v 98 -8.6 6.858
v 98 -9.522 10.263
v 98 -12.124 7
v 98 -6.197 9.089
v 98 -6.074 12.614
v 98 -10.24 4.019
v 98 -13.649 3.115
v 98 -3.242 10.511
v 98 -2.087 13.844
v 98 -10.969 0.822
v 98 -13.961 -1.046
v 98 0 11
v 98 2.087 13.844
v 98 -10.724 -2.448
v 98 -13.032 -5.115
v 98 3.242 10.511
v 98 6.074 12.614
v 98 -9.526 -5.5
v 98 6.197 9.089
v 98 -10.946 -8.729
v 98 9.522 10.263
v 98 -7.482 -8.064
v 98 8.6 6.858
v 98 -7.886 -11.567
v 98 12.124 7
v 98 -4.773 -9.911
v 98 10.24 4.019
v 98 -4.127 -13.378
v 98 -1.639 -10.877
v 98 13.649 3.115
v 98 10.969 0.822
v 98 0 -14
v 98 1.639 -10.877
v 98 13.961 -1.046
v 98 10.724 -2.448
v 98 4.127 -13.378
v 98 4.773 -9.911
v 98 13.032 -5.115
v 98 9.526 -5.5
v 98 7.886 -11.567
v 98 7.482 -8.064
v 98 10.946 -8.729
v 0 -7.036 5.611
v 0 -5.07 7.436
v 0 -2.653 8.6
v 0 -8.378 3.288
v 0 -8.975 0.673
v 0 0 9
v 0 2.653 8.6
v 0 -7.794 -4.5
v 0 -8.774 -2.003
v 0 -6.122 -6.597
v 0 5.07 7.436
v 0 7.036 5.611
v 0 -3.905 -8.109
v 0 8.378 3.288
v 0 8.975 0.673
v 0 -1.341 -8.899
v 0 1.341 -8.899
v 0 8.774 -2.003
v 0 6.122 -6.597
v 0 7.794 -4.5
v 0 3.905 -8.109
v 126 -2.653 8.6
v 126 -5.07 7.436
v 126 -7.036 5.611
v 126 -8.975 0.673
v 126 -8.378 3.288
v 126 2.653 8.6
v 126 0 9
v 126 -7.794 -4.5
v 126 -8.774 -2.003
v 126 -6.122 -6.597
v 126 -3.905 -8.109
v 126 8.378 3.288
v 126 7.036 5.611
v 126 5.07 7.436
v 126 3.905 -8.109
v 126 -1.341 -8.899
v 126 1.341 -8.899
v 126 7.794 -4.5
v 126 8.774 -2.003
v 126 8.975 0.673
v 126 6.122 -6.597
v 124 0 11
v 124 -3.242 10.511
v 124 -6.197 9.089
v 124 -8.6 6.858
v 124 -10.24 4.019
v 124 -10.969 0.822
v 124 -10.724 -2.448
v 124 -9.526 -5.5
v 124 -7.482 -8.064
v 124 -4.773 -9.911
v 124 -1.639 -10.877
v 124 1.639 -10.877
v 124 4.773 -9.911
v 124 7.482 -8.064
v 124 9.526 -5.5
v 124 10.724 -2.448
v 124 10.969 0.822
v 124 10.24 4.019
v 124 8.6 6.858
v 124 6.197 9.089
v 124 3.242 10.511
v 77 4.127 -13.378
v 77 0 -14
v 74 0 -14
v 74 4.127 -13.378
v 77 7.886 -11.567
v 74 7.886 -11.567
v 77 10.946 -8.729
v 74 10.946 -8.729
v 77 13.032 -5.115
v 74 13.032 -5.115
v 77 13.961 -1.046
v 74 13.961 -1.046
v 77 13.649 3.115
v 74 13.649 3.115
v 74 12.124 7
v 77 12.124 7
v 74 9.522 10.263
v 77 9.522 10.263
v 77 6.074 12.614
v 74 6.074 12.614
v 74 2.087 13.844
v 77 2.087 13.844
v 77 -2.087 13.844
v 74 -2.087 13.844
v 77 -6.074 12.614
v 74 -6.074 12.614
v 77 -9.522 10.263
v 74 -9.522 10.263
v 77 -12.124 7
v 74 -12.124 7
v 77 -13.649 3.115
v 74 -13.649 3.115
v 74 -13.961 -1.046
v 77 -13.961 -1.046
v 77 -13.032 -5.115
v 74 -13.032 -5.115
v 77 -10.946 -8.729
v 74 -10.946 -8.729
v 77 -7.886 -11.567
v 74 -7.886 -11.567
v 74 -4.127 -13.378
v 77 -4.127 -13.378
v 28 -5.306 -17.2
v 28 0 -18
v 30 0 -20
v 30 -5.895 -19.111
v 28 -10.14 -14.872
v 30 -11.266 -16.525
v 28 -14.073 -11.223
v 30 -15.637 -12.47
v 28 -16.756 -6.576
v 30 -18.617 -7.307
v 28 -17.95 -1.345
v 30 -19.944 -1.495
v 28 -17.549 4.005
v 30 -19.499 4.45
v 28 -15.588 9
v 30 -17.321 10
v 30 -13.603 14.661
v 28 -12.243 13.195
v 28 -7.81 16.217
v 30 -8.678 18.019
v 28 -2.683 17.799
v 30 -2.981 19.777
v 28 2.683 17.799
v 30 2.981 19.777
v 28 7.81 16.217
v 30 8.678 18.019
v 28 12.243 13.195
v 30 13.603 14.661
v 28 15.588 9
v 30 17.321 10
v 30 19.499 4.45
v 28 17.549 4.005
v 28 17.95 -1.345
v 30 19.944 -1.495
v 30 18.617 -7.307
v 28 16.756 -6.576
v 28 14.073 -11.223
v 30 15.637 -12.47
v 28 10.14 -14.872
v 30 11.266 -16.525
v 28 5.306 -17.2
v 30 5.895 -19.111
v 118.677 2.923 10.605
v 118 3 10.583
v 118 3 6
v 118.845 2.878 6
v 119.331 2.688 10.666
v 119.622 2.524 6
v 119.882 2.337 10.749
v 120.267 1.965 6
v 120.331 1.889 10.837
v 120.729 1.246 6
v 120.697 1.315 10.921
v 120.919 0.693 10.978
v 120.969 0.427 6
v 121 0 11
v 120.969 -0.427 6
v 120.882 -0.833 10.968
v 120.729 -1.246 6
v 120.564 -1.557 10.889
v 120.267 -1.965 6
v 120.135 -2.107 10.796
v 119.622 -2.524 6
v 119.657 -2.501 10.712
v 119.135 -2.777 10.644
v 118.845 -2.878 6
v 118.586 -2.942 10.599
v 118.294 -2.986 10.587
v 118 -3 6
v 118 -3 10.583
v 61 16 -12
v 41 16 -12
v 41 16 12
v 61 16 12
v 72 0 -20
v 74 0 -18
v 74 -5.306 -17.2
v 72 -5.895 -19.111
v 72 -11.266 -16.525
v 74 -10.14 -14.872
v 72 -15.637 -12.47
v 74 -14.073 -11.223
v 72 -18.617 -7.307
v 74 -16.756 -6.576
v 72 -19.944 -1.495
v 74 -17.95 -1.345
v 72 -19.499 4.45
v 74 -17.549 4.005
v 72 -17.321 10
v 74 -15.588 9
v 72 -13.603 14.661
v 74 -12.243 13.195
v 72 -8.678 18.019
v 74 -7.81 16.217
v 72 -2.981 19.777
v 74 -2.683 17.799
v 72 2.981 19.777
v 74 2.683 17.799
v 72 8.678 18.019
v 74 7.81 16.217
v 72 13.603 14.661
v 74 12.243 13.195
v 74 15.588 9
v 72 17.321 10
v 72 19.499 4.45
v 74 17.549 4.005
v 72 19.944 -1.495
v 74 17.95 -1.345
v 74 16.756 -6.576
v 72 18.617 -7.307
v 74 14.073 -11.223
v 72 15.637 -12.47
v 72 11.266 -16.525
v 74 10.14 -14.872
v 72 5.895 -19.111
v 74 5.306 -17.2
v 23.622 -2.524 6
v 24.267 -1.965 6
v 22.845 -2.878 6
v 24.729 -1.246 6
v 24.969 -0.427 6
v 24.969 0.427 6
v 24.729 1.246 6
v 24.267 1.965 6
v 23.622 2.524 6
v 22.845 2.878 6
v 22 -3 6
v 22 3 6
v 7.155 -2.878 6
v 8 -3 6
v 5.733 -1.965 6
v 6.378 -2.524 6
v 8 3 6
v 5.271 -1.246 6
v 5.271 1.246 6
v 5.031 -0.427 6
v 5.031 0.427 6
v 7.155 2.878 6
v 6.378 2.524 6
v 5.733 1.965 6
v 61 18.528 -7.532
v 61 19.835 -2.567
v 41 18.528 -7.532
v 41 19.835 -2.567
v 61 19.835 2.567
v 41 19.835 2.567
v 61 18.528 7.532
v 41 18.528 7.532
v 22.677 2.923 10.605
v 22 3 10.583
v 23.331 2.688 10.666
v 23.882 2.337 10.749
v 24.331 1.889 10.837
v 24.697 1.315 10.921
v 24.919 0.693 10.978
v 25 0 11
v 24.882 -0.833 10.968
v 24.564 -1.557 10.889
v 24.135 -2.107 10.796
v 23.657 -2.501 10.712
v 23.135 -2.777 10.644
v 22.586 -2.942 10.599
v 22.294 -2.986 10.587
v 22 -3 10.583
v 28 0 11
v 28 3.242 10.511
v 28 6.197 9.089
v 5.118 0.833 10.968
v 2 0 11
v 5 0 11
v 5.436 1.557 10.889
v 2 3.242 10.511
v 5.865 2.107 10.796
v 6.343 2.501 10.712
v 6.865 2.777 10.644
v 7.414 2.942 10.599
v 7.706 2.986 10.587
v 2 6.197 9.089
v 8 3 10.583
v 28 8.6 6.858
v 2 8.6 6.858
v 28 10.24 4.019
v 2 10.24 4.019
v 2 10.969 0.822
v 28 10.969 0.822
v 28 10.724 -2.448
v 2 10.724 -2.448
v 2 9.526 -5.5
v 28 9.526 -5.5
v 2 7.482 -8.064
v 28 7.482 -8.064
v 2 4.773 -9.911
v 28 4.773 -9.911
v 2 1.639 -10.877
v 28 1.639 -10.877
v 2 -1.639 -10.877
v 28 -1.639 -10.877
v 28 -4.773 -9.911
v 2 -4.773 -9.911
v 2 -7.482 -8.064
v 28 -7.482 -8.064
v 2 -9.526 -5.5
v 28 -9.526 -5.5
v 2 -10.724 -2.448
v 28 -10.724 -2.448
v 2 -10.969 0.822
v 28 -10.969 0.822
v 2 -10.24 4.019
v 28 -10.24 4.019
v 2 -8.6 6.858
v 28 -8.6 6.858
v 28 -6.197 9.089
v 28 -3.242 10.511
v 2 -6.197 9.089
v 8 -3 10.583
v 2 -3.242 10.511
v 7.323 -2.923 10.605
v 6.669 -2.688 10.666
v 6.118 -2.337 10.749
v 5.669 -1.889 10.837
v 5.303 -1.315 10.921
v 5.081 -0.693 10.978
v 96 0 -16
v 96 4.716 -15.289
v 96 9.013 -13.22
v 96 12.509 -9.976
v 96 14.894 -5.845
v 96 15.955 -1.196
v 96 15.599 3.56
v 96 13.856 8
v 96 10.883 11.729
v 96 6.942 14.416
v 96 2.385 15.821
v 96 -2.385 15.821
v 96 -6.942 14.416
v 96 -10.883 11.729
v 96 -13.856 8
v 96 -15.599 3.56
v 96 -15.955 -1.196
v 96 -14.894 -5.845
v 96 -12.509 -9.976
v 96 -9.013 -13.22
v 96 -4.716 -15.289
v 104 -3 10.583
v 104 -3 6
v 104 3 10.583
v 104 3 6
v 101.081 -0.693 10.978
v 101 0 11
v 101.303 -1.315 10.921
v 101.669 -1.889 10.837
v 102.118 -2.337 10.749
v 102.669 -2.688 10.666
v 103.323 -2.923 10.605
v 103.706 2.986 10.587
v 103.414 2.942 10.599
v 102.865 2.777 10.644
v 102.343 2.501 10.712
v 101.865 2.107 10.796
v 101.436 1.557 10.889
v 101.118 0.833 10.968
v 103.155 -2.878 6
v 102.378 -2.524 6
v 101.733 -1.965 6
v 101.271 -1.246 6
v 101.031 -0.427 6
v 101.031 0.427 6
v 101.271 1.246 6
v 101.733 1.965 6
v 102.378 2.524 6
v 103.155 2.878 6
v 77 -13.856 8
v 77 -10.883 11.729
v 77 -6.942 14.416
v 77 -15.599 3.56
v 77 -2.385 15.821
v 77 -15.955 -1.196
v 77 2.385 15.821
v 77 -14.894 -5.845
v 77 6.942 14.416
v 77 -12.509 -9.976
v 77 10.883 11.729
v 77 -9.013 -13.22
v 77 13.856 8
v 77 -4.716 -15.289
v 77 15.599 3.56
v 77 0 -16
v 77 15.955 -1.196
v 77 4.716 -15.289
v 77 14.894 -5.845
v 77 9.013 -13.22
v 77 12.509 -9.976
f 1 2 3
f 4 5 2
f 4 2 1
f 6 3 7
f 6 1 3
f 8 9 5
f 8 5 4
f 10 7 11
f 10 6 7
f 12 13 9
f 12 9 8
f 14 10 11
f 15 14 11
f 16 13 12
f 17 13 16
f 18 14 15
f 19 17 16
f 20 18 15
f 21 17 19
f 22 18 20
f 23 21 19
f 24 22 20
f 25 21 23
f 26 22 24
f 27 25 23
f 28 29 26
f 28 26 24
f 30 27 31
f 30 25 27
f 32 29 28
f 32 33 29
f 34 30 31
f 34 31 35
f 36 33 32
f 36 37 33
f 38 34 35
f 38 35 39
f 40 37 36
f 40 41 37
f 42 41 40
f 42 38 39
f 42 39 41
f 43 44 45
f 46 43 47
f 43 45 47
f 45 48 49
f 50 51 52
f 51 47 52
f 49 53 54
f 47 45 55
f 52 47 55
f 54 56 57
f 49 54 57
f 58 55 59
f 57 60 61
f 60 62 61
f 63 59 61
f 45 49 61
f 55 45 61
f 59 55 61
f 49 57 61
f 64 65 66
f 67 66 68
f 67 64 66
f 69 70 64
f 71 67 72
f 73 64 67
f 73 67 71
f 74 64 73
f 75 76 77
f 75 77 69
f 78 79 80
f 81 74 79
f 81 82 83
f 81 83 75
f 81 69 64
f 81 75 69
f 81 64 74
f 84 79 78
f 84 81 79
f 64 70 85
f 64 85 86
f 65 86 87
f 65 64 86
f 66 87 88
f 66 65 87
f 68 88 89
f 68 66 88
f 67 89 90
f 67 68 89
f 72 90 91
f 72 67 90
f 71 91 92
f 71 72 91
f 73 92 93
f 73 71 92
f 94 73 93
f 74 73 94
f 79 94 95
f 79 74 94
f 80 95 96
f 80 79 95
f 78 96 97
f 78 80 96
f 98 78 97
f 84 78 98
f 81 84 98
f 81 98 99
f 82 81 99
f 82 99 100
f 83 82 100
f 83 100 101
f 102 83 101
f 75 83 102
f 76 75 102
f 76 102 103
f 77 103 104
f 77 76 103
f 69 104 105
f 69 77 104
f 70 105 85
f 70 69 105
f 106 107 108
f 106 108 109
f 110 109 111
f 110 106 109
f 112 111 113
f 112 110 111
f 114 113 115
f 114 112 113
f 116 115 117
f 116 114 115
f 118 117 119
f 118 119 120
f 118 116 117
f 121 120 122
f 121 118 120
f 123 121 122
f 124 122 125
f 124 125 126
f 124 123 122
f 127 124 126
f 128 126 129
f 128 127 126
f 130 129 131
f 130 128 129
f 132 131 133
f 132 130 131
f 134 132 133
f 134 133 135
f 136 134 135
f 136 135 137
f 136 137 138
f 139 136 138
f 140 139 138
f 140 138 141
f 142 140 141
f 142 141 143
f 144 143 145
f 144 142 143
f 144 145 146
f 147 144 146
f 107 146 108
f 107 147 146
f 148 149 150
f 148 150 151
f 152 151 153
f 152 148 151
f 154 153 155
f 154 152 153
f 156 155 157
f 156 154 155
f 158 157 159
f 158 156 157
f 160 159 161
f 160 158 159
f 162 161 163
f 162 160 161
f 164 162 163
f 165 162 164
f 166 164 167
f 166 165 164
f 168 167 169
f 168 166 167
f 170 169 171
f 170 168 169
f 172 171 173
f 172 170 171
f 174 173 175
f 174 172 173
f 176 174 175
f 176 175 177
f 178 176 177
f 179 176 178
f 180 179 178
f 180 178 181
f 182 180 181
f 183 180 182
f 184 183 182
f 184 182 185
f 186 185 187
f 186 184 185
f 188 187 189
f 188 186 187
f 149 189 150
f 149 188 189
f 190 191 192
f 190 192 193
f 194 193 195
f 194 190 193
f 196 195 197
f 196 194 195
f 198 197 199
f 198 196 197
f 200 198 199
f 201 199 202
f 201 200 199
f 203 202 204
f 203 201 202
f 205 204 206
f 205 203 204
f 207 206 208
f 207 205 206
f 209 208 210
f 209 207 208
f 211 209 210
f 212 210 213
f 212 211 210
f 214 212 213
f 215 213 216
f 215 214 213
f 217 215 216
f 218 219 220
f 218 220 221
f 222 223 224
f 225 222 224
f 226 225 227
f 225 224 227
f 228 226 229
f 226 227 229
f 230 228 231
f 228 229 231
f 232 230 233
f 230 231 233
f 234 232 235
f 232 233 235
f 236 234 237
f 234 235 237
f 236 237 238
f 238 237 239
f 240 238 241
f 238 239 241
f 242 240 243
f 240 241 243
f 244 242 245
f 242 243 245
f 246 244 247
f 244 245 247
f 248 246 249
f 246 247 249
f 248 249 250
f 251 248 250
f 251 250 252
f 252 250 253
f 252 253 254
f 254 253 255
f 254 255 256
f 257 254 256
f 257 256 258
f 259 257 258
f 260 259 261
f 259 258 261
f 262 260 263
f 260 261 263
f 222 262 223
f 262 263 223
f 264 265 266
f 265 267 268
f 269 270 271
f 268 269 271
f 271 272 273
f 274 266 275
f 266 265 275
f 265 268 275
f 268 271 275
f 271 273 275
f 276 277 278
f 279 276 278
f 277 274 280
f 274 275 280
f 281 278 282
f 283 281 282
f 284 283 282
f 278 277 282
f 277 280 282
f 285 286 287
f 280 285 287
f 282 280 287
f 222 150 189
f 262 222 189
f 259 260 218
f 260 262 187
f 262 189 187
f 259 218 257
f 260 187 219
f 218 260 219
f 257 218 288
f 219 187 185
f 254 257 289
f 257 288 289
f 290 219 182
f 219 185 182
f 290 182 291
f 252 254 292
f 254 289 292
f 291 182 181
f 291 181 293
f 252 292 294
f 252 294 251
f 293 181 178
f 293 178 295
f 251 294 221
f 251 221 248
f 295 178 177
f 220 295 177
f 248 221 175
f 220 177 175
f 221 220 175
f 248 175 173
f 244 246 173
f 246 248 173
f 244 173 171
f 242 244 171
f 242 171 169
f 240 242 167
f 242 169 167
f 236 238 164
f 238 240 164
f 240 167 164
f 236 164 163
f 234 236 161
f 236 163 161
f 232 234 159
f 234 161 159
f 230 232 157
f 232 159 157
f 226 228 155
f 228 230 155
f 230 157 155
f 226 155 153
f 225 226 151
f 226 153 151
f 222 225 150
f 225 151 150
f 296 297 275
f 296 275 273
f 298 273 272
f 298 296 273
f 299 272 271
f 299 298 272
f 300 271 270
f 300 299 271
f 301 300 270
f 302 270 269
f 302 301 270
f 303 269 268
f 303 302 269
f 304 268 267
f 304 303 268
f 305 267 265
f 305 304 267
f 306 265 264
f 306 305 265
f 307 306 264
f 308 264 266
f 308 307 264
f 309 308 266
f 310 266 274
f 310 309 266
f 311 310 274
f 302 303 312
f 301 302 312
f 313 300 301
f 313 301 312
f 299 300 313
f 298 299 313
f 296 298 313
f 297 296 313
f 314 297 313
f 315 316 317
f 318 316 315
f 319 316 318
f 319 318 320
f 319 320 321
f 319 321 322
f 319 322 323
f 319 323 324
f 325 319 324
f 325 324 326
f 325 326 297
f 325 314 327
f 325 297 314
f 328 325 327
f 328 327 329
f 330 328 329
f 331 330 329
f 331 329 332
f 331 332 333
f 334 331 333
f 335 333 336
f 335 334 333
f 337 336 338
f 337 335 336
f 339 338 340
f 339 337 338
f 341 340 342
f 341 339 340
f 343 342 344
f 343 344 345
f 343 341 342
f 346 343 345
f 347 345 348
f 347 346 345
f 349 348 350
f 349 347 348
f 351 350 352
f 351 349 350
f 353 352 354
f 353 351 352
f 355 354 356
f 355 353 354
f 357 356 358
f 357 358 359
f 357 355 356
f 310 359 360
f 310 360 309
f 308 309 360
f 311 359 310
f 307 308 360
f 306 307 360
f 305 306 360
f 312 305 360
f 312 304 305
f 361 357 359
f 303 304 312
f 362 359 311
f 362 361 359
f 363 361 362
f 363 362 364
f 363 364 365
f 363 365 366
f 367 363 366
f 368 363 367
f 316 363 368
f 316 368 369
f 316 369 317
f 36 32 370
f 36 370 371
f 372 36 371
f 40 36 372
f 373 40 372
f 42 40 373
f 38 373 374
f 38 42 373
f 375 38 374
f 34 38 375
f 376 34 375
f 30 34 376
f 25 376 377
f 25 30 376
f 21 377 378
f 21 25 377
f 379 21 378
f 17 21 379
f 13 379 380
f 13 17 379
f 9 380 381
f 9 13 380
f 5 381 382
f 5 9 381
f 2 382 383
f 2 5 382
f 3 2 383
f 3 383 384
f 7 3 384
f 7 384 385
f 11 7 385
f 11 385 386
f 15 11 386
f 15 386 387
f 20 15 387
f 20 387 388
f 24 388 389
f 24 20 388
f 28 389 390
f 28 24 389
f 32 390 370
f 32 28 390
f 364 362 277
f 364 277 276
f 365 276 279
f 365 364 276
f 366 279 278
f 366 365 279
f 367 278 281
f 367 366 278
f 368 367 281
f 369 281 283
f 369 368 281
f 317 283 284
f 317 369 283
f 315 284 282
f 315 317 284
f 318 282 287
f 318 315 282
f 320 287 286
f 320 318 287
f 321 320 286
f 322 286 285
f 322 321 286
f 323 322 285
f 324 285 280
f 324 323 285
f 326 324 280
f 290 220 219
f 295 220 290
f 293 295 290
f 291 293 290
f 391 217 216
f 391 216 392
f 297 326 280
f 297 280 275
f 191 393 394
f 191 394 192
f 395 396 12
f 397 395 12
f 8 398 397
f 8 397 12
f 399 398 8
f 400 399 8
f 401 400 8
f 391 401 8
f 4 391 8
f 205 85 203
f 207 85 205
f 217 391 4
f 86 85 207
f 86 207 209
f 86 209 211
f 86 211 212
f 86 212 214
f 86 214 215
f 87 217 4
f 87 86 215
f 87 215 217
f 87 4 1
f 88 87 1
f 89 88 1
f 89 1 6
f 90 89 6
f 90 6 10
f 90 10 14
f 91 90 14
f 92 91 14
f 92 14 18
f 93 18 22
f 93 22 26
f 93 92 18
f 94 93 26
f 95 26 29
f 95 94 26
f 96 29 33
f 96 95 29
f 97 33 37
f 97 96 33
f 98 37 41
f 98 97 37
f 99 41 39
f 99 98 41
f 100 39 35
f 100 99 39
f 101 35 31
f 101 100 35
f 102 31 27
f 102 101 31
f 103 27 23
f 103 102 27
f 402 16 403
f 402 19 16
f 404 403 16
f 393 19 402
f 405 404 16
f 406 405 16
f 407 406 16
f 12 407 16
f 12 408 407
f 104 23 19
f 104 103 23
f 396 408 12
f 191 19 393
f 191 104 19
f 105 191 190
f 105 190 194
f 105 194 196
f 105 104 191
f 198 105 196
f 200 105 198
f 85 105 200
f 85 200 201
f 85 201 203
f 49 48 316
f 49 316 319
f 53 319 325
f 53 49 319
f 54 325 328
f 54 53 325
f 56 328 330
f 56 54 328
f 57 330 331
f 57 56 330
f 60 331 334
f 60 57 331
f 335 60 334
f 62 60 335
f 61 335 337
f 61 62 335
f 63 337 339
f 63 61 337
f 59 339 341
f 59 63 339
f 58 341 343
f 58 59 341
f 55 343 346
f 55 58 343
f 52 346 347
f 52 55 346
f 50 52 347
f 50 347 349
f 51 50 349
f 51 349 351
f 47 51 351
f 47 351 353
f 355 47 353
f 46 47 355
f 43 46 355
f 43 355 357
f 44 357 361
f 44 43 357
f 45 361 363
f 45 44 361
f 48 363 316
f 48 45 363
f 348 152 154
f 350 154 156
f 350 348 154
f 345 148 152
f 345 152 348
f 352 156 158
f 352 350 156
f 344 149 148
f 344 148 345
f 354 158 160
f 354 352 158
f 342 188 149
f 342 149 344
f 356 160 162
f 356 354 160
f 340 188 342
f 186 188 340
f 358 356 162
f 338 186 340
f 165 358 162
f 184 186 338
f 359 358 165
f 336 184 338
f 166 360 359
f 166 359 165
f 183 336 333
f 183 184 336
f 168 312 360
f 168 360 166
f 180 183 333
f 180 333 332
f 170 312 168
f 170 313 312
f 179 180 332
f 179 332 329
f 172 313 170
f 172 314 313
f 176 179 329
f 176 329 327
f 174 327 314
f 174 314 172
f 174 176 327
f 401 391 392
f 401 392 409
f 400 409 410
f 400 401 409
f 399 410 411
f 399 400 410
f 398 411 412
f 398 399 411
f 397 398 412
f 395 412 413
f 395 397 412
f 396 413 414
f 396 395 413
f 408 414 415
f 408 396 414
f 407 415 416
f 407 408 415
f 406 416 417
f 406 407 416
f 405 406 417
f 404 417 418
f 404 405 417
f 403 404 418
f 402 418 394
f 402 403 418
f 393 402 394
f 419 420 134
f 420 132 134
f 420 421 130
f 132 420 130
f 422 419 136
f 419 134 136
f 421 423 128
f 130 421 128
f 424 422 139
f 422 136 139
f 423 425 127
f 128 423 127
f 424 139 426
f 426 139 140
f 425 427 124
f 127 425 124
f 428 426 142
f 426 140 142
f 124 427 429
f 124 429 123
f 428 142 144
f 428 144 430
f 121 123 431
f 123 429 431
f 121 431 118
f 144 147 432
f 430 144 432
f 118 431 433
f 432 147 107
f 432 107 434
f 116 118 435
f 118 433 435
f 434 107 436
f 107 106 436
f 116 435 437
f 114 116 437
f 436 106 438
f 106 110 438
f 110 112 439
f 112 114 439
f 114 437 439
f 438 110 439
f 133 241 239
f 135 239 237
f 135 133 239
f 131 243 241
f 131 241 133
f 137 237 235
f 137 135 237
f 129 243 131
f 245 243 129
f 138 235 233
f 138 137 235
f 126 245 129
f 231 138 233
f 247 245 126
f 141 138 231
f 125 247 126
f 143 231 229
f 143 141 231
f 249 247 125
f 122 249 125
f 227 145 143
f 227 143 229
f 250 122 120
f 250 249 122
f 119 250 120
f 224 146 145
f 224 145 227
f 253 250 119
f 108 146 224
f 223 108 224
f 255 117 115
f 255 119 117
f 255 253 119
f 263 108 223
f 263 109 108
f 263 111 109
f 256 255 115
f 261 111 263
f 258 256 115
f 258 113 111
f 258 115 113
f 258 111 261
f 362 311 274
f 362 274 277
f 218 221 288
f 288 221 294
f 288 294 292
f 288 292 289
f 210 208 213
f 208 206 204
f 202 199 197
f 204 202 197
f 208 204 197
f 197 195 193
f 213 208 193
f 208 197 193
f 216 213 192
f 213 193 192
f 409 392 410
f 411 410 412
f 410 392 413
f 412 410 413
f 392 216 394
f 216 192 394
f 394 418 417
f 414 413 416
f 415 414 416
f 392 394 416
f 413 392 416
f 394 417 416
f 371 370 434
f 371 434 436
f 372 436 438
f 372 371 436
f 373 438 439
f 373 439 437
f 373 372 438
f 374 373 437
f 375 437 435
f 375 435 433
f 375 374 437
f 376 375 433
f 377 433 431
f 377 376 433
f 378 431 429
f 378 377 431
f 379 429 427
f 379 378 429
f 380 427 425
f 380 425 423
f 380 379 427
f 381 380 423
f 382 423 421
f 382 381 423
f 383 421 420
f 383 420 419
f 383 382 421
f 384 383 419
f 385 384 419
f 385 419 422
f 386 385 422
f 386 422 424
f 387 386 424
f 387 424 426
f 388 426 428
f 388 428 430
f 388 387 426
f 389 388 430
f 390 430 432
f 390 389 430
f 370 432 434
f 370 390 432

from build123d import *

# Parameters (mm, degrees)
SKETCH1_R               = 20
BOSS_EXTRUDE1_DEPTH     = 126
SKETCH2_OUTSIDE_W       = 69.624
SKETCH2_OUTSIDE_H       = 69.624
SKETCH2_OUTSIDE_R       = 11
CUT_EXTRUDE1_DEPTH      = 28
SKETCH3_OUTSIDE_W       = 69.624
SKETCH3_OUTSIDE_H       = 69.624
SKETCH3_OUTSIDE_R       = 11
CUT_EXTRUDE2_DEPTH      = 28
SKETCH4_OUTSIDE_W       = 69.624
SKETCH4_OUTSIDE_H       = 69.624
SKETCH4_OUTSIDE_R       = 16
CUT_EXTRUDE3_DEPTH      = 21
SKETCH5_OUTSIDE_W       = 69.624
SKETCH5_OUTSIDE_H       = 69.624
SKETCH5_OUTSIDE_R       = 14
CUT_EXTRUDE4_DEPTH      = 3
CHAMFER1_SIZE           = 2
CUT_EXTRUDE5_DEPTH      = 130.135587659
CUT_EXTRUDE5_DEPTH_BACK = 130.135587659
SKETCH6_W               = 20
SKETCH6_H               = 6
CUT_EXTRUDE6_DEPTH      = 5


with BuildPart() as part:
    # Sketch1 → Boss-Extrude1 (new body)
    with BuildSketch(Plane(origin=(0, 0, 0), x_dir=(0, 0, -1), z_dir=(1, 0, 0))):
        Circle(SKETCH1_R)
    extrude(amount=BOSS_EXTRUDE1_DEPTH)

    # Sketch2 outside → Cut-Extrude1 (cut)
    with BuildSketch(Plane.ZY):
        Rectangle(SKETCH2_OUTSIDE_W, SKETCH2_OUTSIDE_H)
        Circle(SKETCH2_OUTSIDE_R, mode=Mode.SUBTRACT)
    extrude(amount=-CUT_EXTRUDE1_DEPTH, mode=Mode.SUBTRACT)

    # Sketch3 outside → Cut-Extrude2 (cut)
    with BuildSketch(Plane(origin=(126, 0, 0), x_dir=(0, 0, -1), z_dir=(1, 0, 0))):
        Rectangle(SKETCH3_OUTSIDE_W, SKETCH3_OUTSIDE_H)
        with Locations(Location((0, 0, 0), (0, 0, 180))):
            Circle(SKETCH3_OUTSIDE_R, mode=Mode.SUBTRACT)
    extrude(amount=-CUT_EXTRUDE2_DEPTH, mode=Mode.SUBTRACT)

    # Sketch4 outside → Cut-Extrude3 (cut)
    with BuildSketch(Plane(origin=(98, 0, 0), x_dir=(0, 0, -1), z_dir=(1, 0, 0))):
        Rectangle(SKETCH4_OUTSIDE_W, SKETCH4_OUTSIDE_H)
        Circle(SKETCH4_OUTSIDE_R, mode=Mode.SUBTRACT)
    extrude(amount=-CUT_EXTRUDE3_DEPTH, mode=Mode.SUBTRACT)

    # Sketch5 outside → Cut-Extrude4 (cut)
    with BuildSketch(Plane(origin=(77, 0, 0), x_dir=(0, 0, -1), z_dir=(1, 0, 0))):
        Rectangle(SKETCH5_OUTSIDE_W, SKETCH5_OUTSIDE_H)
        Circle(SKETCH5_OUTSIDE_R, mode=Mode.SUBTRACT)
    extrude(amount=-CUT_EXTRUDE4_DEPTH, mode=Mode.SUBTRACT)

    # Chamfer1
    chamfer1_edges = [part.edges().sort_by_distance(p)[0] for p in [
        (0, 0, -11),
        (126, 0, -11),
        (98, 0, 16),
        (74, 0, 20),
        (28, 0, 20),
    ]]
    chamfer(chamfer1_edges, length=CHAMFER1_SIZE)

    # Sketch6 → Cut-Extrude5 (cut, two sides: drawn at the far end of the back side and taken through both)
    with BuildSketch(Plane.XY.offset(-CUT_EXTRUDE5_DEPTH_BACK)):
        with Locations((51, 19)):
            Rectangle(SKETCH6_W, SKETCH6_H)
    extrude(amount=CUT_EXTRUDE5_DEPTH + CUT_EXTRUDE5_DEPTH_BACK, mode=Mode.SUBTRACT)

    # Sketch7 → Cut-Extrude6 (cut)
    with BuildSketch(Plane.XY.offset(11)):
        with BuildLine():
            Line((8, 3), (22, 3))
            ThreePointArc((22, 3), (25, 0), (22, -3))
            Line((22, -3), (8, -3))
            ThreePointArc((8, -3), (5, 0), (8, 3))
        make_face()
        with BuildLine():
            Line((104, 3), (118, 3))
            ThreePointArc((118, 3), (121, 0), (118, -3))
            Line((118, -3), (104, -3))
            ThreePointArc((104, -3), (101, 0), (104, 3))
        make_face()
    extrude(amount=-CUT_EXTRUDE6_DEPTH, mode=Mode.SUBTRACT)


solid = part.part
